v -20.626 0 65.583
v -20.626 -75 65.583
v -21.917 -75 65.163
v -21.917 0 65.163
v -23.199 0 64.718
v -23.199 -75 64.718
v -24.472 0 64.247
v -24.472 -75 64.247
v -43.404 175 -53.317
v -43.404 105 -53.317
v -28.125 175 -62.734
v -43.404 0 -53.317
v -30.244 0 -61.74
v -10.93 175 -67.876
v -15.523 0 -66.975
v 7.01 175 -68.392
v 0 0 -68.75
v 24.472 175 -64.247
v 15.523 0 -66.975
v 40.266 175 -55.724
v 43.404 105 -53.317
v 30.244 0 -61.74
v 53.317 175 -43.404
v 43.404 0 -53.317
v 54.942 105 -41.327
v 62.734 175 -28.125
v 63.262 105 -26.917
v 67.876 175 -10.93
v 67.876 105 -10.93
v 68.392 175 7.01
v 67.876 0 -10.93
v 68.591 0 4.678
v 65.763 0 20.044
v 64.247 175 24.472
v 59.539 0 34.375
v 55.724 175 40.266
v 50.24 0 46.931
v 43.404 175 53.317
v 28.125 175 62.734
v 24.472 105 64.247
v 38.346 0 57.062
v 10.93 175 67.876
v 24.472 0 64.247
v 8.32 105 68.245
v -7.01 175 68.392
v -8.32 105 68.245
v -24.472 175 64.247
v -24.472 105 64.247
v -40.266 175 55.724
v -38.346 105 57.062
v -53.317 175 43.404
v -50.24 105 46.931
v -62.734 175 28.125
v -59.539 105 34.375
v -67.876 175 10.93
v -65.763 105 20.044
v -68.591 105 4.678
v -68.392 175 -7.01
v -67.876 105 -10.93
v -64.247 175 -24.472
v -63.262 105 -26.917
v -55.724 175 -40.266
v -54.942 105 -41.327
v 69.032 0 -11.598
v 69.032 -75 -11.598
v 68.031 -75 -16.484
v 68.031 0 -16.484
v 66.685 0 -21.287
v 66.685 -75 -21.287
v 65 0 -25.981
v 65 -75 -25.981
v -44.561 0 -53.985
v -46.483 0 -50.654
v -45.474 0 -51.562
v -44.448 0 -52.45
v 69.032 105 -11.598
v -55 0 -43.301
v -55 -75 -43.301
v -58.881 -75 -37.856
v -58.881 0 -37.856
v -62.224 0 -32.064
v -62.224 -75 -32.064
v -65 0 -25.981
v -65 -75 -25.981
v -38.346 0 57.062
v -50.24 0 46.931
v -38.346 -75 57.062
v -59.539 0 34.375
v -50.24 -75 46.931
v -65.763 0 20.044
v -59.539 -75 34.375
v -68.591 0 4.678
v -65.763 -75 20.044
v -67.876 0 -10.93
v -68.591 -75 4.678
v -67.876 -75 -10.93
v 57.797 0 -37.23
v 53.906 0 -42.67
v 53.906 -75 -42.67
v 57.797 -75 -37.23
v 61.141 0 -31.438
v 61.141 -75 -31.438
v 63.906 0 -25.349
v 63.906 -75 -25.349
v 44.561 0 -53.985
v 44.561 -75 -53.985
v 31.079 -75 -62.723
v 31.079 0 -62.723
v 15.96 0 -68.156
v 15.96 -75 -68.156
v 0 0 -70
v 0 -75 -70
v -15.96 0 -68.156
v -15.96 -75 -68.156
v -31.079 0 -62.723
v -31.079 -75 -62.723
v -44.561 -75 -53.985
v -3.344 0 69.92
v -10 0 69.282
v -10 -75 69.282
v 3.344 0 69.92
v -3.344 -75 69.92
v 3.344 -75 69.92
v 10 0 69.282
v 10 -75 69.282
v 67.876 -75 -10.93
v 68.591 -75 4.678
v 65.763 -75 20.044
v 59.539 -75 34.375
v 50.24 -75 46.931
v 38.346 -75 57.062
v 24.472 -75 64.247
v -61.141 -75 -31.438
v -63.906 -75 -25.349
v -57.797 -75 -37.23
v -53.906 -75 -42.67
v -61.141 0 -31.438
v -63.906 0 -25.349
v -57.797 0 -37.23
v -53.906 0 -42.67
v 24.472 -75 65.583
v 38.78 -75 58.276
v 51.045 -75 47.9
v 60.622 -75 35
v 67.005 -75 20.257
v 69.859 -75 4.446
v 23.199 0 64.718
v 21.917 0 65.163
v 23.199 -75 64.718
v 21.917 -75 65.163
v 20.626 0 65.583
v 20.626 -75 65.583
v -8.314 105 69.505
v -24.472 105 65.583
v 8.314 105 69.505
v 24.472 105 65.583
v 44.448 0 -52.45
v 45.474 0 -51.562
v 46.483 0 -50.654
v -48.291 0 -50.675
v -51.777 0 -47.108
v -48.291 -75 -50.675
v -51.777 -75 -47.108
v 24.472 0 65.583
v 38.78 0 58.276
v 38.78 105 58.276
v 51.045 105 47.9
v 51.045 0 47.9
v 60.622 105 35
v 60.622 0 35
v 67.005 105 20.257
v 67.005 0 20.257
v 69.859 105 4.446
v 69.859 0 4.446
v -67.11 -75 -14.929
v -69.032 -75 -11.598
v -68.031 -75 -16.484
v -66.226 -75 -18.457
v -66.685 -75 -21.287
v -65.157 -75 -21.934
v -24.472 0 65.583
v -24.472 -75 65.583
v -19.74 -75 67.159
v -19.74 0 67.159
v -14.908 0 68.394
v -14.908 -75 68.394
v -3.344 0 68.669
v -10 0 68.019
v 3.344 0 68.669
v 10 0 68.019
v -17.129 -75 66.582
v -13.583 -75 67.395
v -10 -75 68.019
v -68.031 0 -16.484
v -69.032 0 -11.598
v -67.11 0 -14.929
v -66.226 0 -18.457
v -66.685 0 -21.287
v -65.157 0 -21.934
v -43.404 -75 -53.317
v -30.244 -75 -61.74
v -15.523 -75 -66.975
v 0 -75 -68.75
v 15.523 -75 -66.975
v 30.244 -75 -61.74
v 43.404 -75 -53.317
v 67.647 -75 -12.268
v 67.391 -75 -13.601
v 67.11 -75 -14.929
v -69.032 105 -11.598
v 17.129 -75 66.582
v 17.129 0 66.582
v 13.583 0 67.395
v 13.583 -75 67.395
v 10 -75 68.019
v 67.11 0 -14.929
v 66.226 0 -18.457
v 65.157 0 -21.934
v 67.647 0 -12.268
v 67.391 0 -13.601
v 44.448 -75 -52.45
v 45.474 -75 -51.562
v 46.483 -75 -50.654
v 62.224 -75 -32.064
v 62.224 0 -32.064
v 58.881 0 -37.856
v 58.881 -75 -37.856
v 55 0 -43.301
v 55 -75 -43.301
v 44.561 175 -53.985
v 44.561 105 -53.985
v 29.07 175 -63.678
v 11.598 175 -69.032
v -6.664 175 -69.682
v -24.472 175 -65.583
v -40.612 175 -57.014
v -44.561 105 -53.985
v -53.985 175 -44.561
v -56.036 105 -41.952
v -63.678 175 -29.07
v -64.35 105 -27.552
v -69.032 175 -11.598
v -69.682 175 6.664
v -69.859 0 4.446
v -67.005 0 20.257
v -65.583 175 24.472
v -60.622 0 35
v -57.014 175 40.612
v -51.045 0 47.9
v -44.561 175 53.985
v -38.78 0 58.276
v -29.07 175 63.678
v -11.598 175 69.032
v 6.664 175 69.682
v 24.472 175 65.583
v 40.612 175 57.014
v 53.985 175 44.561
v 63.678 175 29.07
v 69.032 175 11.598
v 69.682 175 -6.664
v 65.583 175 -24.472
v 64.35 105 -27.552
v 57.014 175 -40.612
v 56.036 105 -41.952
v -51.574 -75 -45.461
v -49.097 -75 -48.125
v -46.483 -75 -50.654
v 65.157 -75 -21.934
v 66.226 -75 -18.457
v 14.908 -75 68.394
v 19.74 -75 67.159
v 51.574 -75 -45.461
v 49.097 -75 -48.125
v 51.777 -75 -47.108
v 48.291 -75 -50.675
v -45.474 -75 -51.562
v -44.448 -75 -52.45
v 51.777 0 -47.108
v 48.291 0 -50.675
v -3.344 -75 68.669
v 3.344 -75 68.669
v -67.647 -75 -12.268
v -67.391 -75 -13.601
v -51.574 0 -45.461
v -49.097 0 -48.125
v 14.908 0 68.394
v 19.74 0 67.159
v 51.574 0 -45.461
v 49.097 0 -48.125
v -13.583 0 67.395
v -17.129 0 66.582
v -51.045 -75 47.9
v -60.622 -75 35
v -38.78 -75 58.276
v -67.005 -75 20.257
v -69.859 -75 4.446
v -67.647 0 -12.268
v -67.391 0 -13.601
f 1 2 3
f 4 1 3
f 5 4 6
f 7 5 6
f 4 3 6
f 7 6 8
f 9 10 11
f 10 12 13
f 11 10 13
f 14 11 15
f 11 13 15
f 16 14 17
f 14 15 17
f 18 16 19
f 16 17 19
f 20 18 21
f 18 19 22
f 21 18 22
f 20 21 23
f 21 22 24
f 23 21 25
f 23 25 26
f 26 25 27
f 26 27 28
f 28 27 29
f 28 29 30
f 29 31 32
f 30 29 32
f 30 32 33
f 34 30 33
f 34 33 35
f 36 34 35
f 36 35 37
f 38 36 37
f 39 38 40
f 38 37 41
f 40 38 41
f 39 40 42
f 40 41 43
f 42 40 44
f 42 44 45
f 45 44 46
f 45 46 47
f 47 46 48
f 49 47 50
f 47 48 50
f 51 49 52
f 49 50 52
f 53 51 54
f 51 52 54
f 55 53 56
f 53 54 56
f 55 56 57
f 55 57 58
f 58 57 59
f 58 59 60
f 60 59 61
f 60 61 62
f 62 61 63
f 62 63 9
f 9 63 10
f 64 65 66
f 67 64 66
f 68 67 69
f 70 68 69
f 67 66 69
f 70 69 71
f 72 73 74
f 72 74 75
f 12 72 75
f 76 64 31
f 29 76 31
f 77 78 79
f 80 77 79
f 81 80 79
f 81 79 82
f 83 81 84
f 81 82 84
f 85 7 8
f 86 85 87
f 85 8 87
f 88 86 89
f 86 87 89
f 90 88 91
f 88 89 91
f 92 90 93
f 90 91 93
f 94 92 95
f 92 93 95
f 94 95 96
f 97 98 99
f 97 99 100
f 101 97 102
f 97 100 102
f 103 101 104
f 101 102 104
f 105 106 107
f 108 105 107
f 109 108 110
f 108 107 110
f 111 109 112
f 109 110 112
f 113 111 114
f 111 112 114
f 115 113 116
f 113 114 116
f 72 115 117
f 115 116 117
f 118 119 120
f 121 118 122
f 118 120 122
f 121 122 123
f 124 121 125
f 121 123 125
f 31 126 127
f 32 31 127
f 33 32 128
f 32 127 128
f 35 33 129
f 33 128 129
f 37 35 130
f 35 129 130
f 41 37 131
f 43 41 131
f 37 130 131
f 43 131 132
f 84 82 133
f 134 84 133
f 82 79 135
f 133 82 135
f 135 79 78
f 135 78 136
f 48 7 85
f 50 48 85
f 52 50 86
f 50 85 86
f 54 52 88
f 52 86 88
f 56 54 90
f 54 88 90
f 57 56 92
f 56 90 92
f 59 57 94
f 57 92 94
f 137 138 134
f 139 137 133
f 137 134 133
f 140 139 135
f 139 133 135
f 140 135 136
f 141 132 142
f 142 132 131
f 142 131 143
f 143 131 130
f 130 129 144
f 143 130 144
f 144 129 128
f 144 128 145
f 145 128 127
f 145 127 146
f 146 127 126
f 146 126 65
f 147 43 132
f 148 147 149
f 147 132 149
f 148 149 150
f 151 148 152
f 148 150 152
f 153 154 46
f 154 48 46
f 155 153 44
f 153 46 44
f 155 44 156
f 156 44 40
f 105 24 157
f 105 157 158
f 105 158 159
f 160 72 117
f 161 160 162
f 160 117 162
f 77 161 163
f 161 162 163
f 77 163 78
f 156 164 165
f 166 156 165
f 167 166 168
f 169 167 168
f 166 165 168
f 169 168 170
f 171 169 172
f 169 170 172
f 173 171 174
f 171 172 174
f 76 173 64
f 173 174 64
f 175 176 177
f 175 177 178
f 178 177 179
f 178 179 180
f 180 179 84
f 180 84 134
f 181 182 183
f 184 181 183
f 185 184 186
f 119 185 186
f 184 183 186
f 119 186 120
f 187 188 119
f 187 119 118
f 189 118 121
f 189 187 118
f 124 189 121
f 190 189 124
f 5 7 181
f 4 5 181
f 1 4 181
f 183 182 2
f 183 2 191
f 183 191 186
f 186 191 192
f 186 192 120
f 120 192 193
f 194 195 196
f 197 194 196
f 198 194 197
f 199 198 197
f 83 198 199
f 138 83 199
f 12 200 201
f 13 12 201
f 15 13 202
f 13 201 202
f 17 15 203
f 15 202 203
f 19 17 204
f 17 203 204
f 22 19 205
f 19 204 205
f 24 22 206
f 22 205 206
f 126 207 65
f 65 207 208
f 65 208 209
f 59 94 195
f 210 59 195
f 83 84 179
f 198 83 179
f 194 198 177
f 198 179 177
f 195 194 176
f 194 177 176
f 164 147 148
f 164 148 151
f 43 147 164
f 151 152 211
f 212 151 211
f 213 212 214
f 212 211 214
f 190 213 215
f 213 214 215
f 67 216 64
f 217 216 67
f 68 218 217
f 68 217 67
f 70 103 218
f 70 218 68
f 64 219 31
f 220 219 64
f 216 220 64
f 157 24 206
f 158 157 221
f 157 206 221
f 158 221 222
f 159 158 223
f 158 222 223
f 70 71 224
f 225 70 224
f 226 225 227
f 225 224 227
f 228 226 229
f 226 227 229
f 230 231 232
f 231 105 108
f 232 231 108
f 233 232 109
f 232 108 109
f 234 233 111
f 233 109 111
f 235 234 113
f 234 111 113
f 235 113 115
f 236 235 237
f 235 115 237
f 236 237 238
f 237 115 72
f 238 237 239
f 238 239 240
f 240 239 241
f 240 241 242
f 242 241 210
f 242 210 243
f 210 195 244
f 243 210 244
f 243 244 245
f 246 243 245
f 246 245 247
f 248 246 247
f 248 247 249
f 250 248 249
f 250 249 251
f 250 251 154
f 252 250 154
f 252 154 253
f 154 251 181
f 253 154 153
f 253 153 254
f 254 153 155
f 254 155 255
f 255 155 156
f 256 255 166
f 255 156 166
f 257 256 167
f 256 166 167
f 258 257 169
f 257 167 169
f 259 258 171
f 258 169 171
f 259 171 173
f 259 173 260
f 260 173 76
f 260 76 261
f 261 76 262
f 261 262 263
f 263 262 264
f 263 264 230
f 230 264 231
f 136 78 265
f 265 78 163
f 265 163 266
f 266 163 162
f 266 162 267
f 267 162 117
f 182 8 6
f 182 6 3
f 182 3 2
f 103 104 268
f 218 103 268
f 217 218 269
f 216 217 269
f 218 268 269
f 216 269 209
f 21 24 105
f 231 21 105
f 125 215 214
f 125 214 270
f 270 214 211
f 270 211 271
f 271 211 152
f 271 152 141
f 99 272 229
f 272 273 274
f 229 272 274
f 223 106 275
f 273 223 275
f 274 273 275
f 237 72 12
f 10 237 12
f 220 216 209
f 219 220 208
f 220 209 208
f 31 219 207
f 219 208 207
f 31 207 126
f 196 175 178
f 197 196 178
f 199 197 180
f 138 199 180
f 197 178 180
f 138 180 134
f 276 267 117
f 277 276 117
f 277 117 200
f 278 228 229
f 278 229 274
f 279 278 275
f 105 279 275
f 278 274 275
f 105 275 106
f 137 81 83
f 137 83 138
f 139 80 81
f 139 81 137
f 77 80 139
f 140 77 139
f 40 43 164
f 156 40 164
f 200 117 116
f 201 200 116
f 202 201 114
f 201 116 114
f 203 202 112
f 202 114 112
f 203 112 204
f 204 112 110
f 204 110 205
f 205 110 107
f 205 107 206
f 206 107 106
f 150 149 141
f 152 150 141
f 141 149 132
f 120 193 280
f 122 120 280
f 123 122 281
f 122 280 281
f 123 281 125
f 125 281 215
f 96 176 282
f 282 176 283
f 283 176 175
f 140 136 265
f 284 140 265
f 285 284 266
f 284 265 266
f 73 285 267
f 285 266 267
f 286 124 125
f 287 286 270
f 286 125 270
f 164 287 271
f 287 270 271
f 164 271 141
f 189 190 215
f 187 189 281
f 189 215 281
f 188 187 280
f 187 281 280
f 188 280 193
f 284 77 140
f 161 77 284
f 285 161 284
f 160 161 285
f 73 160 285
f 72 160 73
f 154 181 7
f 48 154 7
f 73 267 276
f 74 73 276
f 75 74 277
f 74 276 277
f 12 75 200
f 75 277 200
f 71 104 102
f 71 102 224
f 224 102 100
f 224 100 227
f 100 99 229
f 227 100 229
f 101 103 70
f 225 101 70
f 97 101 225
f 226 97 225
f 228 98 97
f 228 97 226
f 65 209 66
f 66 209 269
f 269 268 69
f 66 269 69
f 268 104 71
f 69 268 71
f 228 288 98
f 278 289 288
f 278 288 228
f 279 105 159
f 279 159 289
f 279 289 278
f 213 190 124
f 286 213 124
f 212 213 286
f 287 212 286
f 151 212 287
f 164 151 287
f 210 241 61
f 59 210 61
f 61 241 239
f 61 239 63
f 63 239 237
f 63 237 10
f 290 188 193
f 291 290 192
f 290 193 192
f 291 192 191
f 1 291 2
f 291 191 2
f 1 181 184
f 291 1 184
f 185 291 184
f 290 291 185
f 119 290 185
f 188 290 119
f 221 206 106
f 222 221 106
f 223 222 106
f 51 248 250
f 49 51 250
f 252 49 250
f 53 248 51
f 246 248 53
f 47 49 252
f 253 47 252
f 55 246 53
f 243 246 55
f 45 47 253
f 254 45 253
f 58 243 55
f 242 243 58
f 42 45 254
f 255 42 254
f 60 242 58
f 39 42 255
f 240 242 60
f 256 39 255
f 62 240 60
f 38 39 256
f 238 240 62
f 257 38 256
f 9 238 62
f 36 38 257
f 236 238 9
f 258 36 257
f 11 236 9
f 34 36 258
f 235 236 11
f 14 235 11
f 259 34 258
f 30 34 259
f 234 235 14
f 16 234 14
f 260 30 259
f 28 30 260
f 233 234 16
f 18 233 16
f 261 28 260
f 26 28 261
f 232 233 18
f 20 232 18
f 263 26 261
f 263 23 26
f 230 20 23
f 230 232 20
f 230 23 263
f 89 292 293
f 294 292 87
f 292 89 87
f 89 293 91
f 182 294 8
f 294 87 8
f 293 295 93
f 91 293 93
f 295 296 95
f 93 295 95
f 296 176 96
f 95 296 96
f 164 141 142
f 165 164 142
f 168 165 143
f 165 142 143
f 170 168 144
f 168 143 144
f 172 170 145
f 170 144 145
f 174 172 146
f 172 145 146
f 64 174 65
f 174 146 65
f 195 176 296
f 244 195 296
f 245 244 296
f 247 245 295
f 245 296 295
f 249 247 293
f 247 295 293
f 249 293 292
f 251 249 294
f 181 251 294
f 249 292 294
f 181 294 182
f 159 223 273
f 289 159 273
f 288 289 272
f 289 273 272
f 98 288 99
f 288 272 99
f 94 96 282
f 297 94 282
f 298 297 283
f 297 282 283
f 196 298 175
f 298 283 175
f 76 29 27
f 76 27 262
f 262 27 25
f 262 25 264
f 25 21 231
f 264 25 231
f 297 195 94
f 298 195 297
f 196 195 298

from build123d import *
from build123d.topology import SkipClean

# Parameters (mm, degrees)
BOSS_EXTRUDE7_DEPTH   = 105
BOSS_EXTRUDE7_2_DEPTH = 105
BOSS_EXTRUDE7_3_DEPTH = 105
BOSS_EXTRUDE8_START   = 105
BOSS_EXTRUDE8_DEPTH   = 70
BOSS_EXTRUDE9_START   = -75
BOSS_EXTRUDE9_DEPTH   = 75


with BuildPart() as part:
    # Sketch1 → Boss-Extrude7 (new body)
    with BuildSketch(Plane(origin=(0, 0, 0), x_dir=(1, 0, 0), z_dir=(0, 1, 0))):
        with BuildLine():
            ThreePointArc((44.560555468860024, 53.984783933129265), (3.537e-14, 70.00000000000001), (-44.56055546885996, 53.98478393312931))
            Line((-44.56055546886001, 53.984783933129364), (-43.403648557534325, 53.31684341644816))
            ThreePointArc((-43.403648557534325, 53.31684341644814), (1.28652e-12, 68.75), (43.403648557536336, 53.3168434164465))
            Line((43.40364855753577, 53.3168434164489), (44.56055546886009, 53.984783933129336))
        make_face()
    extrude(amount=BOSS_EXTRUDE7_DEPTH)



with BuildPart() as body_2:
    # Sketch1 → Boss-Extrude7 2 (new body)
    with BuildSketch(Plane(origin=(0, 0, 0), x_dir=(1, 0, 0), z_dir=(0, 1, 0))):
        with BuildLine():
            ThreePointArc((70.00000000000001, 0), (69.75769865284899, 5.819233511237749), (69.03247203833395, 11.598181076213804))
            Line((69.03247203833403, 11.59818107621382), (67.87556512700833, 10.930240559532546))
            ThreePointArc((67.87556512700833, 10.930240559532546), (68.53104261019901, 5.482581395573491), (68.75, 0))
            ThreePointArc((68.75, -1.684e-14), (56.60833315047941, -39.01357607198209), (24.471916569473954, -64.24708397598062))
            Line((24.47191656947394, -64.24708397598064), (24.471916569473937, -65.58296500934298))
            ThreePointArc((24.47191656947391, -65.58296500934301), (57.50232238728785, -39.91845337771012), (70.00000000000001, -1.715e-14))
        make_face()
    extrude(amount=BOSS_EXTRUDE7_2_DEPTH)


with BuildPart() as body_3:
    # Sketch1 → Boss-Extrude7 3 (new body)
    with BuildSketch(Plane(origin=(0, 0, 0), x_dir=(1, 0, 0), z_dir=(0, 1, 0))):
        with BuildLine():
            Line((-67.87556512700831, 10.93024055953267), (-69.03247203833394, 11.598181076213848))
            ThreePointArc((-69.03247203833394, 11.598181076213844), (-60.621778264910745, -34.999999999999964), (-24.471916569473937, -65.58296500934301))
            Line((-24.471916569473937, -65.58296500934298), (-24.47191656947394, -64.24708397598064))
            ThreePointArc((-24.47191656947398, -64.24708397598062), (-53.31684341644806, -43.40364855753442), (-67.87556512700831, -10.930240559532654))
            ThreePointArc((-67.87556512700831, -10.930240559532654), (-68.75, 8.42e-15), (-67.87556512700831, 10.93024055953267))
        make_face()
    extrude(amount=BOSS_EXTRUDE7_3_DEPTH)


with BuildPart() as part_1:
    add(part.part)

    add(body_2.part)  # Boss-Extrude8 merges body 2

    add(body_3.part)  # Boss-Extrude8 merges body 3
    # Sketch1<22> → Boss-Extrude8 (add)
    with BuildSketch(Plane(origin=(0, 0, 0), x_dir=(1, 0, 0), z_dir=(0, 1, 0)).offset(BOSS_EXTRUDE8_START)):
        with BuildLine():
            Line((-44.56055546886001, 53.984783933129364), (-46.48344921652614, 50.6542342646151))
            ThreePointArc((-46.4834492165269, 50.654234264615674), (-44.96326231975128, 52.008341076842996), (-43.403648557534325, 53.31684341644814))
            Line((-43.403648557534325, 53.31684341644816), (-44.56055546886001, 53.984783933129364))
        make_face()
        with BuildLine():
            ThreePointArc((-53.90604277152018, 42.669673688874596), (-50.353260344306015, 46.809311816117734), (-46.4834492165269, 50.654234264615674))
            Line((-46.48344921652614, 50.6542342646151), (-44.56055546886001, 53.984783933129364))
            ThreePointArc((-44.56055546885996, 53.98478393312931), (-50.06606053801366, 48.9222810404825), (-54.99999999999996, 43.30127018922201))
            Line((-54.99999999999998, 43.30127018922202), (-53.9060427715193, 42.66967368887677))
        make_face()
        with BuildLine():
            ThreePointArc((-63.90604277151851, 25.349165613188287), (-62.93593715669987, 27.670025554883836), (-61.88157858292415, 29.953843360834068))
            ThreePointArc((-61.88157858292415, 29.953843360834068), (-58.241878403455715, 36.530071174815404), (-53.90604277152018, 42.669673688874596))
            Line((-53.9060427715193, 42.66967368887677), (-54.99999999999998, 43.30127018922202))
            ThreePointArc((-54.99999999999996, 43.30127018922201), (-60.621778264910674, 35.000000000000085), (-64.99999999999997, 25.980762113533245))
            Line((-64.99999999999997, 25.980762113533242), (-63.90604277151891, 25.349165613187772))
        make_face()
        with BuildLine():
            Line((-69.03247203833394, 11.598181076213848), (-67.10957829067064, 14.92873074472319))
            ThreePointArc((-67.10957829066999, 14.928730744722952), (-65.71468333857909, 20.20254671347838), (-63.90604277151851, 25.349165613188287))
            Line((-63.90604277151891, 25.349165613187772), (-64.99999999999997, 25.980762113533242))
            ThreePointArc((-64.99999999999997, 25.980762113533245), (-67.40096846114643, 18.897339773088344), (-69.03247203833394, 11.598181076213844))
        make_face()
        with BuildLine():
            ThreePointArc((-67.87556512700831, 10.93024055953267), (-67.5221757411079, 12.935156867504151), (-67.10957829066999, 14.928730744722952))
            Line((-67.10957829067064, 14.92873074472319), (-69.03247203833394, 11.598181076213848))
            Line((-69.03247203833394, 11.598181076213848), (-67.87556512700831, 10.93024055953267))
        make_face()
        with BuildLine():
            Line((-67.87556512700831, 10.93024055953267), (-69.03247203833394, 11.598181076213848))
            ThreePointArc((-69.03247203833394, 11.598181076213844), (-60.621778264910745, -34.999999999999964), (-24.471916569473937, -65.58296500934301))
            Line((-24.471916569473937, -65.58296500934298), (-24.47191656947394, -64.24708397598064))
            ThreePointArc((-24.47191656947398, -64.24708397598062), (-53.31684341644806, -43.40364855753442), (-67.87556512700831, -10.930240559532654))
            ThreePointArc((-67.87556512700831, -10.930240559532654), (-68.75, 8.42e-15), (-67.87556512700831, 10.93024055953267))
        make_face()
        with BuildLine():
            Line((-24.47191656947394, -64.24708397598064), (-24.471916569473937, -65.58296500934298))
            Line((-24.471916569473937, -65.58296500934298), (-20.626129074147464, -65.58296500934298))
            ThreePointArc((-20.626129074147347, -65.58296500934227), (-22.558913421358792, -64.9434979443488), (-24.47191656947398, -64.24708397598062))
        make_face()
        with BuildLine():
            Line((-20.626129074147464, -65.58296500934298), (-24.471916569473937, -65.58296500934298))
            ThreePointArc((-24.471916569473937, -65.58296500934301), (-17.334907923132807, -67.81962081357068), (-10.000000000000046, -69.2820323027551))
            Line((-10.000000000000002, -69.28203230275511), (-10.000000000000002, -68.01883930206449))
            ThreePointArc((-9.999999999998154, -68.01883930206422), (-15.361422994275008, -67.01185852959877), (-20.626129074147347, -65.58296500934227))
        make_face()
        with BuildLine():
            Line((-10.000000000000002, -68.01883930206449), (-10.000000000000002, -69.28203230275511))
            ThreePointArc((-10.000000000000046, -69.2820323027551), (-1.286e-14, -70.00000000000001), (10.000000000000021, -69.2820323027551))
            Line((10.000000000000002, -69.28203230275511), (10.000000000000002, -68.01883930206453))
            ThreePointArc((9.999999999997948, -68.01883930206425), (7.5050235244553045, -68.33913316612505), (5.000000000000001, -68.56794075951238))
            ThreePointArc((5.000000000000001, -68.56794075951238), (-2.5150304377160433, -68.70398184892461), (-9.999999999998154, -68.01883930206422))
        make_face()
        with BuildLine():
            Line((20.626129074142252, -65.58296500934298), (24.471916569473937, -65.58296500934298))
            Line((24.471916569473937, -65.58296500934298), (24.47191656947394, -64.24708397598064))
            ThreePointArc((24.471916569473954, -64.24708397598062), (22.55891342135629, -64.94349794434969), (20.62612907414237, -65.58296500934384))
        make_face()
        with BuildLine():
            Line((10.000000000000002, -68.01883930206453), (10.000000000000002, -69.28203230275511))
            ThreePointArc((10.000000000000021, -69.2820323027551), (17.334907923132782, -67.8196208135707), (24.47191656947391, -65.58296500934301))
            Line((24.471916569473937, -65.58296500934298), (20.626129074142252, -65.58296500934298))
            ThreePointArc((20.62612907414237, -65.58296500934384), (15.361422994272365, -67.01185852959937), (9.999999999997948, -68.01883930206425))
        make_face()
        with BuildLine():
            ThreePointArc((70.00000000000001, 0), (69.75769865284899, 5.819233511237749), (69.03247203833395, 11.598181076213804))
            Line((69.03247203833403, 11.59818107621382), (67.87556512700833, 10.930240559532546))
            ThreePointArc((67.87556512700833, 10.930240559532546), (68.53104261019901, 5.482581395573491), (68.75, 0))
            ThreePointArc((68.75, -1.684e-14), (56.60833315047941, -39.01357607198209), (24.471916569473954, -64.24708397598062))
            Line((24.47191656947394, -64.24708397598064), (24.471916569473937, -65.58296500934298))
            ThreePointArc((24.47191656947391, -65.58296500934301), (57.50232238728785, -39.91845337771012), (70.00000000000001, -1.715e-14))
        make_face()
        with BuildLine():
            Line((67.87556512700833, 10.930240559532546), (69.03247203833403, 11.59818107621382))
            Line((69.03247203833403, 11.59818107621382), (67.10957829066899, 14.928730744726206))
            ThreePointArc((67.10957829066923, 14.9287307447263), (67.52217574110759, 12.935156867505773), (67.87556512700833, 10.930240559532546))
        make_face()
        with BuildLine():
            ThreePointArc((69.03247203833395, 11.598181076213804), (67.40096846114645, 18.897339773088273), (65.00000000000001, 25.980762113533164))
            Line((65.00000000000011, 25.980762113533206), (63.90604277151851, 25.349165613187427))
            ThreePointArc((63.906042771519196, 25.34916561318654), (65.71468333857887, 20.202546713479123), (67.10957829066923, 14.9287307447263))
            Line((67.10957829066899, 14.928730744726206), (69.03247203833403, 11.59818107621382))
        make_face()
        with BuildLine():
            ThreePointArc((65.00000000000001, 25.980762113533164), (60.62177826491072, 35), (55.00000000000002, 43.30127018922193))
            Line((55.0000000000001, 43.30127018922198), (53.90604277151935, 42.6696736888767))
            ThreePointArc((53.906042771520234, 42.66967368887453), (55.43091363224439, 40.669107611240534), (56.88157858292419, 38.614097398678375))
            ThreePointArc((56.88157858292419, 38.614097398678375), (60.75690884117242, 32.17391067410776), (63.906042771519196, 25.34916561318654))
            Line((63.90604277151851, 25.349165613187427), (65.00000000000011, 25.980762113533206))
        make_face()
        with BuildLine():
            ThreePointArc((55.00000000000002, 43.30127018922193), (50.0660605380137, 48.92228104048245), (44.560555468860024, 53.984783933129265))
            Line((44.56055546886009, 53.984783933129336), (46.48344921652566, 50.654234264616036))
            ThreePointArc((46.48344921652611, 50.6542342646164), (50.353260344305696, 46.809311816118075), (53.906042771520234, 42.66967368887453))
            Line((53.90604277151935, 42.6696736888767), (55.0000000000001, 43.30127018922198))
        make_face()
        with BuildLine():
            Line((44.56055546886009, 53.984783933129336), (43.40364855753577, 53.3168434164489))
            ThreePointArc((43.403648557536336, 53.3168434164465), (44.96326231975186, 52.0083410768425), (46.48344921652611, 50.6542342646164))
            Line((46.48344921652566, 50.654234264616036), (44.56055546886009, 53.984783933129336))
        make_face()
        with BuildLine():
            ThreePointArc((44.560555468860024, 53.984783933129265), (3.537e-14, 70.00000000000001), (-44.56055546885996, 53.98478393312931))
            Line((-44.56055546886001, 53.984783933129364), (-43.403648557534325, 53.31684341644816))
            ThreePointArc((-43.403648557534325, 53.31684341644814), (1.28652e-12, 68.75), (43.403648557536336, 53.3168434164465))
            Line((43.40364855753577, 53.3168434164489), (44.56055546886009, 53.984783933129336))
        make_face()
    extrude(amount=BOSS_EXTRUDE8_DEPTH)

    # Sketch1<23> → Boss-Extrude9 (add)
    with SkipClean():  # the faces are left unmerged after this step: merging them gives an invalid solid
        with BuildSketch(Plane(origin=(0, 0, 0), x_dir=(1, 0, 0), z_dir=(0, 1, 0)).offset(BOSS_EXTRUDE9_START)):
            with BuildLine():
                ThreePointArc((-53.90604277152018, 42.669673688874596), (-50.353260344306015, 46.809311816117734), (-46.4834492165269, 50.654234264615674))
                Line((-46.48344921652614, 50.6542342646151), (-44.56055546886001, 53.984783933129364))
                ThreePointArc((-44.56055546885996, 53.98478393312931), (-50.06606053801366, 48.9222810404825), (-54.99999999999996, 43.30127018922201))
                Line((-54.99999999999998, 43.30127018922202), (-53.9060427715193, 42.66967368887677))
            make_face()
            with BuildLine():
                ThreePointArc((-63.90604277151851, 25.349165613188287), (-62.93593715669987, 27.670025554883836), (-61.88157858292415, 29.953843360834068))
                ThreePointArc((-61.88157858292415, 29.953843360834068), (-58.241878403455715, 36.530071174815404), (-53.90604277152018, 42.669673688874596))
                Line((-53.9060427715193, 42.66967368887677), (-54.99999999999998, 43.30127018922202))
                ThreePointArc((-54.99999999999996, 43.30127018922201), (-60.621778264910674, 35.000000000000085), (-64.99999999999997, 25.980762113533245))
                Line((-64.99999999999997, 25.980762113533242), (-63.90604277151891, 25.349165613187772))
            make_face()
            with BuildLine():
                Line((-69.03247203833394, 11.598181076213848), (-67.10957829067064, 14.92873074472319))
                ThreePointArc((-67.10957829066999, 14.928730744722952), (-65.71468333857909, 20.20254671347838), (-63.90604277151851, 25.349165613188287))
                Line((-63.90604277151891, 25.349165613187772), (-64.99999999999997, 25.980762113533242))
                ThreePointArc((-64.99999999999997, 25.980762113533245), (-67.40096846114643, 18.897339773088344), (-69.03247203833394, 11.598181076213844))
            make_face()
            with BuildLine():
                ThreePointArc((-67.87556512700831, 10.93024055953267), (-67.5221757411079, 12.935156867504151), (-67.10957829066999, 14.928730744722952))
                Line((-67.10957829067064, 14.92873074472319), (-69.03247203833394, 11.598181076213848))
                Line((-69.03247203833394, 11.598181076213848), (-67.87556512700831, 10.93024055953267))
            make_face()
            with BuildLine():
                Line((-67.87556512700831, 10.93024055953267), (-69.03247203833394, 11.598181076213848))
                ThreePointArc((-69.03247203833394, 11.598181076213844), (-60.621778264910745, -34.999999999999964), (-24.471916569473937, -65.58296500934301))
                Line((-24.471916569473937, -65.58296500934298), (-24.47191656947394, -64.24708397598064))
                ThreePointArc((-24.47191656947398, -64.24708397598062), (-53.31684341644806, -43.40364855753442), (-67.87556512700831, -10.930240559532654))
                ThreePointArc((-67.87556512700831, -10.930240559532654), (-68.75, 8.42e-15), (-67.87556512700831, 10.93024055953267))
            make_face()
            with BuildLine():
                Line((-44.56055546886001, 53.984783933129364), (-46.48344921652614, 50.6542342646151))
                ThreePointArc((-46.4834492165269, 50.654234264615674), (-44.96326231975128, 52.008341076842996), (-43.403648557534325, 53.31684341644814))
                Line((-43.403648557534325, 53.31684341644816), (-44.56055546886001, 53.984783933129364))
            make_face()
            with BuildLine():
                ThreePointArc((44.560555468860024, 53.984783933129265), (3.537e-14, 70.00000000000001), (-44.56055546885996, 53.98478393312931))
                Line((-44.56055546886001, 53.984783933129364), (-43.403648557534325, 53.31684341644816))
                ThreePointArc((-43.403648557534325, 53.31684341644814), (1.28652e-12, 68.75), (43.403648557536336, 53.3168434164465))
                Line((43.40364855753577, 53.3168434164489), (44.56055546886009, 53.984783933129336))
            make_face()
            with BuildLine():
                Line((44.56055546886009, 53.984783933129336), (43.40364855753577, 53.3168434164489))
                ThreePointArc((43.403648557536336, 53.3168434164465), (44.96326231975186, 52.0083410768425), (46.48344921652611, 50.6542342646164))
                Line((46.48344921652566, 50.654234264616036), (44.56055546886009, 53.984783933129336))
            make_face()
            with BuildLine():
                ThreePointArc((55.00000000000002, 43.30127018922193), (50.0660605380137, 48.92228104048245), (44.560555468860024, 53.984783933129265))
                Line((44.56055546886009, 53.984783933129336), (46.48344921652566, 50.654234264616036))
                ThreePointArc((46.48344921652611, 50.6542342646164), (50.353260344305696, 46.809311816118075), (53.906042771520234, 42.66967368887453))
                Line((53.90604277151935, 42.6696736888767), (55.0000000000001, 43.30127018922198))
            make_face()
            with BuildLine():
                ThreePointArc((65.00000000000001, 25.980762113533164), (60.62177826491072, 35), (55.00000000000002, 43.30127018922193))
                Line((55.0000000000001, 43.30127018922198), (53.90604277151935, 42.6696736888767))
                ThreePointArc((53.906042771520234, 42.66967368887453), (55.43091363224439, 40.669107611240534), (56.88157858292419, 38.614097398678375))
                ThreePointArc((56.88157858292419, 38.614097398678375), (60.75690884117242, 32.17391067410776), (63.906042771519196, 25.34916561318654))
                Line((63.90604277151851, 25.349165613187427), (65.00000000000011, 25.980762113533206))
            make_face()
            with BuildLine():
                ThreePointArc((69.03247203833395, 11.598181076213804), (67.40096846114645, 18.897339773088273), (65.00000000000001, 25.980762113533164))
                Line((65.00000000000011, 25.980762113533206), (63.90604277151851, 25.349165613187427))
                ThreePointArc((63.906042771519196, 25.34916561318654), (65.71468333857887, 20.202546713479123), (67.10957829066923, 14.9287307447263))
                Line((67.10957829066899, 14.928730744726206), (69.03247203833403, 11.59818107621382))
            make_face()
            with BuildLine():
                Line((67.87556512700833, 10.930240559532546), (69.03247203833403, 11.59818107621382))
                Line((69.03247203833403, 11.59818107621382), (67.10957829066899, 14.928730744726206))
                ThreePointArc((67.10957829066923, 14.9287307447263), (67.52217574110759, 12.935156867505773), (67.87556512700833, 10.930240559532546))
            make_face()
            with BuildLine():
                ThreePointArc((70.00000000000001, 0), (69.75769865284899, 5.819233511237749), (69.03247203833395, 11.598181076213804))
                Line((69.03247203833403, 11.59818107621382), (67.87556512700833, 10.930240559532546))
                ThreePointArc((67.87556512700833, 10.930240559532546), (68.53104261019901, 5.482581395573491), (68.75, 0))
                ThreePointArc((68.75, -1.684e-14), (56.60833315047941, -39.01357607198209), (24.471916569473954, -64.24708397598062))
                Line((24.47191656947394, -64.24708397598064), (24.471916569473937, -65.58296500934298))
                ThreePointArc((24.47191656947391, -65.58296500934301), (57.50232238728785, -39.91845337771012), (70.00000000000001, -1.715e-14))
            make_face()
            with BuildLine():
                Line((-24.47191656947394, -64.24708397598064), (-24.471916569473937, -65.58296500934298))
                Line((-24.471916569473937, -65.58296500934298), (-20.626129074147464, -65.58296500934298))
                ThreePointArc((-20.626129074147347, -65.58296500934227), (-22.558913421358792, -64.9434979443488), (-24.47191656947398, -64.24708397598062))
            make_face()
            with BuildLine():
                Line((-20.626129074147464, -65.58296500934298), (-24.471916569473937, -65.58296500934298))
                ThreePointArc((-24.471916569473937, -65.58296500934301), (-17.334907923132807, -67.81962081357068), (-10.000000000000046, -69.2820323027551))
                Line((-10.000000000000002, -69.28203230275511), (-10.000000000000002, -68.01883930206449))
                ThreePointArc((-9.999999999998154, -68.01883930206422), (-15.361422994275008, -67.01185852959877), (-20.626129074147347, -65.58296500934227))
            make_face()
            with BuildLine():
                Line((-10.000000000000002, -68.01883930206449), (-10.000000000000002, -69.28203230275511))
                ThreePointArc((-10.000000000000046, -69.2820323027551), (-1.286e-14, -70.00000000000001), (10.000000000000021, -69.2820323027551))
                Line((10.000000000000002, -69.28203230275511), (10.000000000000002, -68.01883930206453))
                ThreePointArc((9.999999999997948, -68.01883930206425), (7.5050235244553045, -68.33913316612505), (5.000000000000001, -68.56794075951238))
                ThreePointArc((5.000000000000001, -68.56794075951238), (-2.5150304377160433, -68.70398184892461), (-9.999999999998154, -68.01883930206422))
            make_face()
            with BuildLine():
                Line((20.626129074142252, -65.58296500934298), (24.471916569473937, -65.58296500934298))
                Line((24.471916569473937, -65.58296500934298), (24.47191656947394, -64.24708397598064))
                ThreePointArc((24.471916569473954, -64.24708397598062), (22.55891342135629, -64.94349794434969), (20.62612907414237, -65.58296500934384))
            make_face()
            with BuildLine():
                Line((10.000000000000002, -68.01883930206453), (10.000000000000002, -69.28203230275511))
                ThreePointArc((10.000000000000021, -69.2820323027551), (17.334907923132782, -67.8196208135707), (24.47191656947391, -65.58296500934301))
                Line((24.471916569473937, -65.58296500934298), (20.626129074142252, -65.58296500934298))
                ThreePointArc((20.62612907414237, -65.58296500934384), (15.361422994272365, -67.01185852959937), (9.999999999997948, -68.01883930206425))
            make_face()
        extrude(amount=BOSS_EXTRUDE9_DEPTH)


solid = part_1.part
